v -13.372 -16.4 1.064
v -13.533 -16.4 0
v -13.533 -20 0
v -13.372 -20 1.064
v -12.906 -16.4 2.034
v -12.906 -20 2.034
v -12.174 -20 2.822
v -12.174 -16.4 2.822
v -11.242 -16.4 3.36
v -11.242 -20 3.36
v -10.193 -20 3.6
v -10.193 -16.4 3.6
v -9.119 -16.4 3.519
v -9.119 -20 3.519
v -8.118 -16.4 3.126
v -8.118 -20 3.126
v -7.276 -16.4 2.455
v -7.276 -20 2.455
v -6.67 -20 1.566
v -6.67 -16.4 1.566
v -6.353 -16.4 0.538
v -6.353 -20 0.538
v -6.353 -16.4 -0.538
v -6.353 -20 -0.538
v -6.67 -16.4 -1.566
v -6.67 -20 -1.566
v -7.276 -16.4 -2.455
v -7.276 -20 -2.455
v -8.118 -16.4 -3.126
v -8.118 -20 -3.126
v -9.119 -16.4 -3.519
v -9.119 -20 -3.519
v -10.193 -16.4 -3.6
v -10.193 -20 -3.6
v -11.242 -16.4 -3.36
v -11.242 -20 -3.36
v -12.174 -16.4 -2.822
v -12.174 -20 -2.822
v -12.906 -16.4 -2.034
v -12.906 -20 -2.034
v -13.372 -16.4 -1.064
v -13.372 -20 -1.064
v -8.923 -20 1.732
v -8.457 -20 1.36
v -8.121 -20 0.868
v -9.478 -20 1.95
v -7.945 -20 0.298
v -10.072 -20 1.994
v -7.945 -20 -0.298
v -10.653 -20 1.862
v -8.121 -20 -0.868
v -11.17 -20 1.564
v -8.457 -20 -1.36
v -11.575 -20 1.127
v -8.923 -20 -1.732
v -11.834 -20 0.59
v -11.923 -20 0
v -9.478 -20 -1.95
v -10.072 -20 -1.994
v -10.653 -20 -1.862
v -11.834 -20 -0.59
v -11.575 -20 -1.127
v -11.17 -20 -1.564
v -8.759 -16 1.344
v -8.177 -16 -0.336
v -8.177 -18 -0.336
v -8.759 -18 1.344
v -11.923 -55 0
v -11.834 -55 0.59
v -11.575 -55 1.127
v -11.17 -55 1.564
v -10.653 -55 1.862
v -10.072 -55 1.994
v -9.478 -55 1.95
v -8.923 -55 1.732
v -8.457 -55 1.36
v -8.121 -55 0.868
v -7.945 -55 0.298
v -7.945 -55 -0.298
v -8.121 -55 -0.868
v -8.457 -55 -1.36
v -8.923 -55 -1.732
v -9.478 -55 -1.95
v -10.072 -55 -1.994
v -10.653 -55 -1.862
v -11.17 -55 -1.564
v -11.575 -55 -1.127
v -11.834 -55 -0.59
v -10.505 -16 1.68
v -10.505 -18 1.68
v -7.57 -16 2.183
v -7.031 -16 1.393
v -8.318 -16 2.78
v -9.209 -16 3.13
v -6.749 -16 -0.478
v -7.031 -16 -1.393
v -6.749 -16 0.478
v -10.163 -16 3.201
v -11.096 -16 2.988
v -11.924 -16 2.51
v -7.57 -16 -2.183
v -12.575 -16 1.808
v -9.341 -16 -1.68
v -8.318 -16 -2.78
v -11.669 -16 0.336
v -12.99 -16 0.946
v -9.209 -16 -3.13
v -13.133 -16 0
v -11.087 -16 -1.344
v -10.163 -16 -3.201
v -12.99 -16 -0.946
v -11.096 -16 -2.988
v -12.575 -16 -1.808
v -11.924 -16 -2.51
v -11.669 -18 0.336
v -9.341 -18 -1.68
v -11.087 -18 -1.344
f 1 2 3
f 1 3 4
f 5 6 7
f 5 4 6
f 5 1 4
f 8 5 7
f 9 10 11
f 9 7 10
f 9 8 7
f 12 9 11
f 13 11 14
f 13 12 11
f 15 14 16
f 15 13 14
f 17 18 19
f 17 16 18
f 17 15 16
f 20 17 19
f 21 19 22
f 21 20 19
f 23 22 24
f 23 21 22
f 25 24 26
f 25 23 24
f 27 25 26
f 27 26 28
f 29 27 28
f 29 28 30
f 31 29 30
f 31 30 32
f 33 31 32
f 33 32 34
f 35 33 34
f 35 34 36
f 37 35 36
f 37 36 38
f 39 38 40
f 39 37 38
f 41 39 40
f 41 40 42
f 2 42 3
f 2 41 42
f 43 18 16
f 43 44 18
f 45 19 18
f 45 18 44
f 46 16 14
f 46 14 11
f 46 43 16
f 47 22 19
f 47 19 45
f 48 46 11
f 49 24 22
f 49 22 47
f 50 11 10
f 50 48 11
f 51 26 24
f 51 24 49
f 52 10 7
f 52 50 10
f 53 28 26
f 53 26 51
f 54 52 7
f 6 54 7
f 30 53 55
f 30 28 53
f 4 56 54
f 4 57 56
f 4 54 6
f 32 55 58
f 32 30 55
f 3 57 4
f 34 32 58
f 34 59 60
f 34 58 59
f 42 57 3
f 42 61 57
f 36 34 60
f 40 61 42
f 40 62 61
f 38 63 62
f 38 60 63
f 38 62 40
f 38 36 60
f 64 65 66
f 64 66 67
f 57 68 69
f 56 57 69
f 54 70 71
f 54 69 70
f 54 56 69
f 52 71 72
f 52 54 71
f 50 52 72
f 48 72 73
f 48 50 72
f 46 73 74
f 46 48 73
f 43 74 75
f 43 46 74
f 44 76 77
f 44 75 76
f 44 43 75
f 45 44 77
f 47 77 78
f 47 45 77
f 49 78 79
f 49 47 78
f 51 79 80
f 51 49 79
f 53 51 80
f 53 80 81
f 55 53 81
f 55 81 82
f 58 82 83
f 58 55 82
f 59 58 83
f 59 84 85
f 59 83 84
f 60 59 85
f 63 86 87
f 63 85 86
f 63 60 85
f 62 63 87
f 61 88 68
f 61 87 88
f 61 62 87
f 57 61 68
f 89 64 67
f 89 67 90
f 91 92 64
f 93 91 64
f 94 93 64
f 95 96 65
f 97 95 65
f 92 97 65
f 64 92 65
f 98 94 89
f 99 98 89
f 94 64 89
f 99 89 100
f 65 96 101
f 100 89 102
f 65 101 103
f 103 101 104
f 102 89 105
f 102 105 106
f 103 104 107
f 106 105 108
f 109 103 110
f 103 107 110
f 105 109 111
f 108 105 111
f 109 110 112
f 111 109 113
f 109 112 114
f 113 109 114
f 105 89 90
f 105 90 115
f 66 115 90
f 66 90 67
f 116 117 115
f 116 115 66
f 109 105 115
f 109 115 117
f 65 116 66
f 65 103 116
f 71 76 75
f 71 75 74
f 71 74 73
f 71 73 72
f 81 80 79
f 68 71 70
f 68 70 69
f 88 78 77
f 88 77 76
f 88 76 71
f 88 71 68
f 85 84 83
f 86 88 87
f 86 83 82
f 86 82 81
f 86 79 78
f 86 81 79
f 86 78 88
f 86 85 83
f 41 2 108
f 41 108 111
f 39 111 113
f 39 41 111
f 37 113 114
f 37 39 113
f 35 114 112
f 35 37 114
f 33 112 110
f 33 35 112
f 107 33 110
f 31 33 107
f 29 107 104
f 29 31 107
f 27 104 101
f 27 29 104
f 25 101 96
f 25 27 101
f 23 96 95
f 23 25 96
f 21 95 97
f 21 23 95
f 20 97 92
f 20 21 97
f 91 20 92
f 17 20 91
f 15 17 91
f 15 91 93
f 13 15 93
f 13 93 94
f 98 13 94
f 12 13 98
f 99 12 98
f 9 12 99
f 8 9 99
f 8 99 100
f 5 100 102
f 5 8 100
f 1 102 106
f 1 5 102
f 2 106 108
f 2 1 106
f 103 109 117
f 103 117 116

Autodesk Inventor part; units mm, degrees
ref_plane "YZ Plane" through (0, 0, 0) normal (1, 0, 0) x (0, 1, 0)
ref_plane "XZ Plane" through (0, 0, 0) normal (0, 1, 0) x (-1, 0, 0)
ref_plane "XY Plane" through (0, 0, 0) normal (0, 0, 1) x (1, 0, 0)
sketch "Sketch1" plane through (0, 0, 0) normal (0, 0, 1) x (1, 0, 0)
  line L0 (-9.9228, -20) -> (-13.5328, -20)
  line L1 (-13.5328, -20) -> (-13.5328, -16)
  line L2 (-13.5328, -16) -> (-9.9228, -16)
  line L3 (-9.9228, -16) -> (-9.9228, -20)
  line L4 (-9.9228, -20) -> (-9.9228, -55)
  line L5 (-9.9228, -55) -> (-11.9228, -55)
  line L6 (-11.9228, -55) -> (-11.9228, -20)
  point P0 (0, 0)
  dimension "d0" = 3.61
  dimension "d1" = 4
  dimension "d3" = 2
  dimension "d16" = 35
revolve "Revolution1" add sketch "Sketch1" angle 360 about axis through (-9.9228, -20, 0) along (0, -1, 0)
chamfer "Chamfer1" distance 0.4 angle 45 1 edges at (-6.3128, -16, 0)
sketch "Boceto2" plane through (-9.9228, -16, 0) normal (0, 1, 0) x (1, 0, 0)
  line L0 (1.1641, -1.3443) -> (-0.5821, -1.6803)
  line L1 (-0.5821, -1.6803) -> (-1.7462, -0.336)
  line L2 (-1.7462, -0.336) -> (-1.1641, 1.3443)
  line L3 (-1.1641, 1.3443) -> (0.5821, 1.6803)
  line L4 (0.5821, 1.6803) -> (1.7462, 0.336)
  line L5 (1.7462, 0.336) -> (1.1641, -1.3443)
  point P0 (9.9228, 0)
  point P1 (0, 0)
  dimension "d11" = 3.08
extrude "Extrusión1" cut sketch "Boceto2" against normal blind 2
thread "Rosca1" size "M4x0.7" class "6g" standard "ISO Metric profile" length 430
properties part number "Tornillo Allen cabeza cilindrica M4x35mm"
